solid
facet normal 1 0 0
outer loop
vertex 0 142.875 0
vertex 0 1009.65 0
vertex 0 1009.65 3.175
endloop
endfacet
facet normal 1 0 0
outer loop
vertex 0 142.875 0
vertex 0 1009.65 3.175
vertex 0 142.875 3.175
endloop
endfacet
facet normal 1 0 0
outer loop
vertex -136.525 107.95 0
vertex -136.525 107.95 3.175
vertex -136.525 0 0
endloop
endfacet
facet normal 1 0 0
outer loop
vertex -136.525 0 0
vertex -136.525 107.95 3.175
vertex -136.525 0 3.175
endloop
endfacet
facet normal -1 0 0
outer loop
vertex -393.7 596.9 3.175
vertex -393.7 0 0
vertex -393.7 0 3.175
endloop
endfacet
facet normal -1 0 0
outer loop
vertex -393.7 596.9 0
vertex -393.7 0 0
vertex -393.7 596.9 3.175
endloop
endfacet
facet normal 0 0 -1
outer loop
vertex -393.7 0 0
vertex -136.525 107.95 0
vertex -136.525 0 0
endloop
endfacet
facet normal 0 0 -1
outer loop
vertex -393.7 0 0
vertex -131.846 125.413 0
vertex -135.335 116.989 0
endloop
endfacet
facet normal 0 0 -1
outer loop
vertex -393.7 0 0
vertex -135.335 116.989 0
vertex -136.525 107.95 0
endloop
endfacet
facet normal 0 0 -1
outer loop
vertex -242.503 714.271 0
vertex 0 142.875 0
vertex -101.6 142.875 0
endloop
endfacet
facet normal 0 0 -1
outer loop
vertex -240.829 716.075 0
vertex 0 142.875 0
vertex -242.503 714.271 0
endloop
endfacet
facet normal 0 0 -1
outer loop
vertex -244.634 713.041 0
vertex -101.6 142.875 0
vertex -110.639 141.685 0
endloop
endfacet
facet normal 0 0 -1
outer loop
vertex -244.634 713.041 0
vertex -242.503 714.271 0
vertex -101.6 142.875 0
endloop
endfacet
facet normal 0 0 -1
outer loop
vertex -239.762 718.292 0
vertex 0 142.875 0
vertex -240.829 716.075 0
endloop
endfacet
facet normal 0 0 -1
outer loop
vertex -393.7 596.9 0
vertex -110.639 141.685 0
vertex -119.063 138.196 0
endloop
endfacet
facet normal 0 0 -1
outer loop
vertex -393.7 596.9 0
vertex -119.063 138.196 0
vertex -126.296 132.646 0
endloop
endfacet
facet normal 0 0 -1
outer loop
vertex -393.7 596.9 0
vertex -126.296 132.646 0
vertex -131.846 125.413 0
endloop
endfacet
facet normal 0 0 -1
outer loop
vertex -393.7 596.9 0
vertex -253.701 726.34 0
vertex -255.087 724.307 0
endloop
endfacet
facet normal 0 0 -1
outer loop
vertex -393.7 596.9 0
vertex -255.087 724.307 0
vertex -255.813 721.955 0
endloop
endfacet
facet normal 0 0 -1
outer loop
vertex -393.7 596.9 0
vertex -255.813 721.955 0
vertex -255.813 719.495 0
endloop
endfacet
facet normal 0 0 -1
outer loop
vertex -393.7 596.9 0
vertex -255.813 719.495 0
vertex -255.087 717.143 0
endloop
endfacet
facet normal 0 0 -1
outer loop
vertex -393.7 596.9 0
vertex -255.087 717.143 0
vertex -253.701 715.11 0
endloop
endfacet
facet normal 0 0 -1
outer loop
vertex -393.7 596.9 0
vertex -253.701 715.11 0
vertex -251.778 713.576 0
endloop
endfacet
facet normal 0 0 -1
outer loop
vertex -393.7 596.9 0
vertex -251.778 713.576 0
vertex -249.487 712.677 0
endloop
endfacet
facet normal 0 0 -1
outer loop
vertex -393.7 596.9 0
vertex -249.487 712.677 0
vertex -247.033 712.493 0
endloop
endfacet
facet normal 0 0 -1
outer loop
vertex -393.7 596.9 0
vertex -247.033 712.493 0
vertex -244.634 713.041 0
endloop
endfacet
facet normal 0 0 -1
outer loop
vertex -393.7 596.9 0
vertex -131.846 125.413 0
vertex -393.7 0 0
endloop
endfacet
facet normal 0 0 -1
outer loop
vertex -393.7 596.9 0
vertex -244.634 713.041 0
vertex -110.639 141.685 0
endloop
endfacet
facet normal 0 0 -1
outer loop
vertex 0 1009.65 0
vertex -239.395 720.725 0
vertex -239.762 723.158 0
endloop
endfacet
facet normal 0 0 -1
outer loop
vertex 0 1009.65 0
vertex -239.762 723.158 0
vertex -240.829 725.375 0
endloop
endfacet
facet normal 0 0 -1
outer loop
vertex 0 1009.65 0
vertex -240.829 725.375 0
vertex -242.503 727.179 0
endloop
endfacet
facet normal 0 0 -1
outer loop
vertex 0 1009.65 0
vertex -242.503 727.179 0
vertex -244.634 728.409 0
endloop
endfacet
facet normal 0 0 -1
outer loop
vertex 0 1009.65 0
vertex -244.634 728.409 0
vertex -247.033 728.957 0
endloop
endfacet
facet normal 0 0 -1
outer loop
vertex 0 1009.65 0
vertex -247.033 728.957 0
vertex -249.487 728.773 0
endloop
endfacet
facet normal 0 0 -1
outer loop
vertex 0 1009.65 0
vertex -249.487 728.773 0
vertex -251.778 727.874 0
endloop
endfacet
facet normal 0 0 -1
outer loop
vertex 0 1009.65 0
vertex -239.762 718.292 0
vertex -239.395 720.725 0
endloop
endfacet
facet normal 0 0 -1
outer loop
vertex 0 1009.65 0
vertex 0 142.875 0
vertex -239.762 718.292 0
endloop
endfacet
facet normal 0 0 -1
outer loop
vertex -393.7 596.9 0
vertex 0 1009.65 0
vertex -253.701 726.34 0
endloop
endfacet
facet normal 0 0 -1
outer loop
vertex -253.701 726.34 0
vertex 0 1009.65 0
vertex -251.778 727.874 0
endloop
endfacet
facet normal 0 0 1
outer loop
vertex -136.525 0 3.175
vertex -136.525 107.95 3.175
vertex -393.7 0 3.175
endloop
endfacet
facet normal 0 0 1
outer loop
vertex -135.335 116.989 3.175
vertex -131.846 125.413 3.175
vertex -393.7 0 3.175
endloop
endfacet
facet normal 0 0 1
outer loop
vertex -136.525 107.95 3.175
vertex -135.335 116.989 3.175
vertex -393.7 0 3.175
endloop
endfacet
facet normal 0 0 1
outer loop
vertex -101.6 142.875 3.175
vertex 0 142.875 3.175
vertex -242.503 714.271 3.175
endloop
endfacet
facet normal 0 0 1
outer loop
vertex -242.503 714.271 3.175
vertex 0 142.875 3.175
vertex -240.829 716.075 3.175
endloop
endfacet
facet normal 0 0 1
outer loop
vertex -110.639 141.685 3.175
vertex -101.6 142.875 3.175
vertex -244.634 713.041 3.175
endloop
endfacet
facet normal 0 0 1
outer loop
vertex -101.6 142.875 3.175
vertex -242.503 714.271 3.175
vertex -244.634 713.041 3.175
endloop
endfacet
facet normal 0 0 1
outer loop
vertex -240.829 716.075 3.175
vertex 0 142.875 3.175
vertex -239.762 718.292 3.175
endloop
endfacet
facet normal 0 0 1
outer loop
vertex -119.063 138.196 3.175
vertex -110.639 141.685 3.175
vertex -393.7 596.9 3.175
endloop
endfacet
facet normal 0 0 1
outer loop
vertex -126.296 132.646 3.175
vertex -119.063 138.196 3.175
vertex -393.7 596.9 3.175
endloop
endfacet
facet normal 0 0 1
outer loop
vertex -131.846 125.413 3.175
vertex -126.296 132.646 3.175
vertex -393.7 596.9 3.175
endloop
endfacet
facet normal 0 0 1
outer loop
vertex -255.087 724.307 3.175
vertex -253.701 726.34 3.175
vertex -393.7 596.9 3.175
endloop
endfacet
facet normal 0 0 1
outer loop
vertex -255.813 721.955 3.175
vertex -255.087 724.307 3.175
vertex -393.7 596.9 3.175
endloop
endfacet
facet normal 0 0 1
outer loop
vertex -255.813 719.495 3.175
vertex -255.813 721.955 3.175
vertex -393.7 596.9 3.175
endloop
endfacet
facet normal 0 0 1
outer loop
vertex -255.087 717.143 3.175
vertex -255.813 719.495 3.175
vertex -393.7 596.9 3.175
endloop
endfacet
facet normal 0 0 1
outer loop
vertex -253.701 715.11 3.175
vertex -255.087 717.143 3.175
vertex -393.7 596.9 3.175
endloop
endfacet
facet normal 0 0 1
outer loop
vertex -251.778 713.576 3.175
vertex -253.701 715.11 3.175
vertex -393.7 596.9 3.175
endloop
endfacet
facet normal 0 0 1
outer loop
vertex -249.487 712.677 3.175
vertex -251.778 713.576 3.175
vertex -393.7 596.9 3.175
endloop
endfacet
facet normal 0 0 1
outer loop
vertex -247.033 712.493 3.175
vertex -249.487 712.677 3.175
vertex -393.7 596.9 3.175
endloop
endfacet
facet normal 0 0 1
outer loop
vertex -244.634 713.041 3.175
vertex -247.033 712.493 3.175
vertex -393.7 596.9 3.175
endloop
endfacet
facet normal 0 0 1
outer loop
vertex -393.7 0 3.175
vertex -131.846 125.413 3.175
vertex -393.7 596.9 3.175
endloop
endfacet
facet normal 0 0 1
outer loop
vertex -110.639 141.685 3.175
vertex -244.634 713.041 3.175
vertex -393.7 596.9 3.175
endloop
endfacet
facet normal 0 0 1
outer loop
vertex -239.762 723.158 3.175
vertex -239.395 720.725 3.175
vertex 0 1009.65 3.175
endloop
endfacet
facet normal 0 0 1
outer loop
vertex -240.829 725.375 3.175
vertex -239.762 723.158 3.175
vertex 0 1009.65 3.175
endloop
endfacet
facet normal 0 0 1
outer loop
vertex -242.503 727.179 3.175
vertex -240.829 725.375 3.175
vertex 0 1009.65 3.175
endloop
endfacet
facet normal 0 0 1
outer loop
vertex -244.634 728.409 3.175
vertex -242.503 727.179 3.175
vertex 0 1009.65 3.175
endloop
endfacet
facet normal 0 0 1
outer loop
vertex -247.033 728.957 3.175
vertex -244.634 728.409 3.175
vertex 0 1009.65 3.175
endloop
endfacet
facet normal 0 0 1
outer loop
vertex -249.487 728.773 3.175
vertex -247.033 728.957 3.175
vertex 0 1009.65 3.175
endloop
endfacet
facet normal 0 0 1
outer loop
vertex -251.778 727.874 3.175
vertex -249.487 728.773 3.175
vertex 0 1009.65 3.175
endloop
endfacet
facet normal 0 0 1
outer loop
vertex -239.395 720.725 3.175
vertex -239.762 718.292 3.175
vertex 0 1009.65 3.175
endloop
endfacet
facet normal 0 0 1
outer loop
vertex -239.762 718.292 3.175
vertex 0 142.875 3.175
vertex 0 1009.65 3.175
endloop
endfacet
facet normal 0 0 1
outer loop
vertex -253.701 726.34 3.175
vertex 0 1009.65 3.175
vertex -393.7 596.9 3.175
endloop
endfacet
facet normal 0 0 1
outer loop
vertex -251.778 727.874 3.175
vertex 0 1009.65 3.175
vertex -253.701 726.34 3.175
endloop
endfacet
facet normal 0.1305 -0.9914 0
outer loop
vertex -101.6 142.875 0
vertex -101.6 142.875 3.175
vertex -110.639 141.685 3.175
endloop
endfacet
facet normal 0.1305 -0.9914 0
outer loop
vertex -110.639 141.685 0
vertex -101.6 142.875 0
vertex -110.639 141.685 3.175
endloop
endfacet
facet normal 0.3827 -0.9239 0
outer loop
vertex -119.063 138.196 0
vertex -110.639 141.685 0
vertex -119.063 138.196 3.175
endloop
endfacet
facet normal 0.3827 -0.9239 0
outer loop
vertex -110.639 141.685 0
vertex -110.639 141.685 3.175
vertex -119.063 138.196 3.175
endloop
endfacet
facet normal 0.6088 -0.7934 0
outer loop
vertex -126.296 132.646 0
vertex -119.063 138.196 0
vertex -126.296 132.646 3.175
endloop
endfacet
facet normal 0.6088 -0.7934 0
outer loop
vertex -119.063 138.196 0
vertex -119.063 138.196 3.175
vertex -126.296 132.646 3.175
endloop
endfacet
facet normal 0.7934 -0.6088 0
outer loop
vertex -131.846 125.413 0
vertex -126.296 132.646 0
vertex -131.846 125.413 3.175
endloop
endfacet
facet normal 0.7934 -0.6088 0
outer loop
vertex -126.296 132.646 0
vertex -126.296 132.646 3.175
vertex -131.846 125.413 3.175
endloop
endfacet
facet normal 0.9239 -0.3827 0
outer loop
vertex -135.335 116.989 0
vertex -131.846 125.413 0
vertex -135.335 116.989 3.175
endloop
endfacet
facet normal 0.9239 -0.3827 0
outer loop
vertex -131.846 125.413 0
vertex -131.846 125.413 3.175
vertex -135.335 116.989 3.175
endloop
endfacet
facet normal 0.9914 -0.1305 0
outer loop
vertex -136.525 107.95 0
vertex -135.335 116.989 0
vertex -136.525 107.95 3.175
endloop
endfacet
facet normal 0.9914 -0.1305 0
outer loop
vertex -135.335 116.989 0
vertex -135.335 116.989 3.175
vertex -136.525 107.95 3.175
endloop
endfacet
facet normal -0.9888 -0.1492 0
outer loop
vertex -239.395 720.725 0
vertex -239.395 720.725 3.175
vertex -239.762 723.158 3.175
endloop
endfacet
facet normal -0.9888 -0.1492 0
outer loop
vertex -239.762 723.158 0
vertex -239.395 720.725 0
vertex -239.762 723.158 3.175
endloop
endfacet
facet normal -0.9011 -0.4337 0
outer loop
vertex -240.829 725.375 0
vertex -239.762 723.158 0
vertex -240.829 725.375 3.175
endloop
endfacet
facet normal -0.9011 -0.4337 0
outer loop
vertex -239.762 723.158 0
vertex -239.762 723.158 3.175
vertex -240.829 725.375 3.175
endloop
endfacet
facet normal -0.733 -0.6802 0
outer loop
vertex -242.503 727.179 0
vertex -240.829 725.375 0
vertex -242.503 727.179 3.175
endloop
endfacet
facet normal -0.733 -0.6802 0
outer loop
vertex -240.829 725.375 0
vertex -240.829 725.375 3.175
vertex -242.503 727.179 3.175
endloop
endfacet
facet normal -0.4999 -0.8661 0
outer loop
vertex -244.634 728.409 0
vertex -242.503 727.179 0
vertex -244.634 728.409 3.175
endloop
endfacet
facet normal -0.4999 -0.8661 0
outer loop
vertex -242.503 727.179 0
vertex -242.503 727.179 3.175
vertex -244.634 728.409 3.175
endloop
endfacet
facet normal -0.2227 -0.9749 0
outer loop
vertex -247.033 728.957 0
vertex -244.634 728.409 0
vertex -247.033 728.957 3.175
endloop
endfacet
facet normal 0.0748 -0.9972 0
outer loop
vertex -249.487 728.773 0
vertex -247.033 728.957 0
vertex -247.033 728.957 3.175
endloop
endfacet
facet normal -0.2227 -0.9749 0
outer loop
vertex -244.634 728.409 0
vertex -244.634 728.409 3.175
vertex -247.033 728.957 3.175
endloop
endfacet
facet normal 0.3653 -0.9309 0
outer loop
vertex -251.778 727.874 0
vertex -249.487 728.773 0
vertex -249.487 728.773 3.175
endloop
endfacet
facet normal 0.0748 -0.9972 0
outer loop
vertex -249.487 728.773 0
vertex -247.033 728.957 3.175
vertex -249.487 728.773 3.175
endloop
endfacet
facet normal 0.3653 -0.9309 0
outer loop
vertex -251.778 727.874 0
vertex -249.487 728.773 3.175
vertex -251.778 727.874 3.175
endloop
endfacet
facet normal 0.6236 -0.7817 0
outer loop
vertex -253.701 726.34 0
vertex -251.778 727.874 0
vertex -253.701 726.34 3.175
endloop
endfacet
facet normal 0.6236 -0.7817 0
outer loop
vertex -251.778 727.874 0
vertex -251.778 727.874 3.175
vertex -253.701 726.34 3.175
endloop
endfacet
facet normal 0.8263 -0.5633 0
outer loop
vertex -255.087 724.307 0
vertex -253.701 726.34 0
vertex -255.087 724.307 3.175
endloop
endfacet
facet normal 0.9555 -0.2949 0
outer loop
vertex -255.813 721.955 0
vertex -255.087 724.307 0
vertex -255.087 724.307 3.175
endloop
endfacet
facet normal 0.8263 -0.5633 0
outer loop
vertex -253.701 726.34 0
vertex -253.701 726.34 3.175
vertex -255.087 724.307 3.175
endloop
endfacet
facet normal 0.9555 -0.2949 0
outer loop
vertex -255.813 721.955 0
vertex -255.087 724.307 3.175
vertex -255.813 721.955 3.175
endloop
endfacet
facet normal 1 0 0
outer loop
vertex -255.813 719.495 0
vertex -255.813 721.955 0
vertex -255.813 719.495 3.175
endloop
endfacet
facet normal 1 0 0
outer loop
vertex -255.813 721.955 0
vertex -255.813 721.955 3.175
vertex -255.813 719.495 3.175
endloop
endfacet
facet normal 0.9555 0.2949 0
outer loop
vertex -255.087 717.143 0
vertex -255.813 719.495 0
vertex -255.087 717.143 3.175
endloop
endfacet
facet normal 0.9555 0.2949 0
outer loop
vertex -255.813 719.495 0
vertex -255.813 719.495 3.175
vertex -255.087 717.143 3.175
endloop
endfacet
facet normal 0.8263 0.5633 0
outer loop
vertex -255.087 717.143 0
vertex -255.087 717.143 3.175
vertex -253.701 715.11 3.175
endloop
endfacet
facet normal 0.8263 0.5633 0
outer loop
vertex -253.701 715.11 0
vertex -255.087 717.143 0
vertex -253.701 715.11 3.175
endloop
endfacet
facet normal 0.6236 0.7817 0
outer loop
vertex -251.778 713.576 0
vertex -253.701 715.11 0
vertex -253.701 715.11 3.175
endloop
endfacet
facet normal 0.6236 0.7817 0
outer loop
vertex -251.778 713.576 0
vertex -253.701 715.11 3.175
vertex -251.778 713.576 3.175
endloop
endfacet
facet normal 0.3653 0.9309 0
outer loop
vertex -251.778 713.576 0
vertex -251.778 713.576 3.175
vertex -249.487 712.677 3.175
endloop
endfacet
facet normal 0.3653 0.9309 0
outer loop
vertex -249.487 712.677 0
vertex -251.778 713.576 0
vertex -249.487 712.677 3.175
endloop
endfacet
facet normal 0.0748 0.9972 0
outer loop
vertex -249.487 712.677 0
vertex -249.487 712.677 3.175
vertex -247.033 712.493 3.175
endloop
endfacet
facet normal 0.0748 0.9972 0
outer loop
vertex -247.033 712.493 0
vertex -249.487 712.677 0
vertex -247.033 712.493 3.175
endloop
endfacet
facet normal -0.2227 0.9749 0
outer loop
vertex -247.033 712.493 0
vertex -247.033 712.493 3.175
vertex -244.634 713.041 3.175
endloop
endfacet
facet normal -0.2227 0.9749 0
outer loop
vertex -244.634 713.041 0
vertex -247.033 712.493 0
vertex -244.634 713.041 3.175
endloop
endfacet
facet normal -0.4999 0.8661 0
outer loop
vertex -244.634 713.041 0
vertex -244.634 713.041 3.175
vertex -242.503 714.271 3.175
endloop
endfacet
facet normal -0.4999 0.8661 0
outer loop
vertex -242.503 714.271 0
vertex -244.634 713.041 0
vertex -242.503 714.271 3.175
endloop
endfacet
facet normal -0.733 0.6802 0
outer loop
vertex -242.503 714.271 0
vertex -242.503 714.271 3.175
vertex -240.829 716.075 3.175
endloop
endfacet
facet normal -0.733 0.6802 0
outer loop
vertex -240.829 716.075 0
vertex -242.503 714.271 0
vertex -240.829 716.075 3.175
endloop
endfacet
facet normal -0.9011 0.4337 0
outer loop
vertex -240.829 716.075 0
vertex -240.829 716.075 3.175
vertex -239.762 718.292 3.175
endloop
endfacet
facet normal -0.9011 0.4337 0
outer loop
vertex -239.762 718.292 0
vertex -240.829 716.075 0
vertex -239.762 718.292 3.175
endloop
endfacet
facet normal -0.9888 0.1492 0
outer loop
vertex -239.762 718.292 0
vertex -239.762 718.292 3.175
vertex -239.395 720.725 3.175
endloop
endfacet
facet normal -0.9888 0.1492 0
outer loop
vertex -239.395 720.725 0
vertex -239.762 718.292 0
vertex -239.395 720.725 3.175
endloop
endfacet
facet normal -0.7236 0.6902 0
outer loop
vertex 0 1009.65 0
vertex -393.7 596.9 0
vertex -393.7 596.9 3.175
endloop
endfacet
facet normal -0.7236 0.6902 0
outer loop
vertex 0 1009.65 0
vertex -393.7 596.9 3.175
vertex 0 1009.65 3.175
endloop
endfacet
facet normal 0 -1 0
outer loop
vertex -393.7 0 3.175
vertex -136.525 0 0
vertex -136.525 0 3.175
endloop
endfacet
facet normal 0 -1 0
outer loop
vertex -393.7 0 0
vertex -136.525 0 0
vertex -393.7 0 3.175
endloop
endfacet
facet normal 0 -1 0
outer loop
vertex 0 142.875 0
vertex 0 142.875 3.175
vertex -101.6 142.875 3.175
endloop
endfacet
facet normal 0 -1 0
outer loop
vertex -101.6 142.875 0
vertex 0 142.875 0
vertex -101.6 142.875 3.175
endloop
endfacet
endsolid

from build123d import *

# Parameters (mm, degrees)
BOSS_EXTRUDE1_DEPTH = 3.175
SKETCH5_R           = 8.255
CUT_EXTRUDE3_DEPTH  = 4.175
CUT_EXTRUDE4_DEPTH  = 4.175


with BuildPart() as part:
    # Sketch1 → Boss-Extrude1 (new body)
    with BuildSketch(Plane.XY):
        Polygon((0, 0), (-393.7, 0), (-393.7, 596.9), (0, 1009.65), align=None)
    extrude(amount=BOSS_EXTRUDE1_DEPTH)

    # Sketch5 → Cut-Extrude3 (cut, through all)
    with BuildSketch(Plane.XY.offset(3.175)):
        with Locations((-247.65, 720.725)):
            Circle(SKETCH5_R)
    extrude(amount=-CUT_EXTRUDE3_DEPTH, mode=Mode.SUBTRACT)

    # Sketch6 → Cut-Extrude4 (cut, through all)
    with BuildSketch(Plane.XY.offset(3.175)):
        with BuildLine():
            Line((0, 142.875), (-101.6, 142.875))
            ThreePointArc((-101.6, 142.875), (-126.295704333, 132.645704333), (-136.525, 107.95))
            Line((-136.525, 107.95), (-136.525, 0))
            Line((-136.525, 0), (0, 0))
            Line((0, 0), (0, 142.875))
        make_face()
    extrude(amount=-CUT_EXTRUDE4_DEPTH, mode=Mode.SUBTRACT)


solid = part.part
